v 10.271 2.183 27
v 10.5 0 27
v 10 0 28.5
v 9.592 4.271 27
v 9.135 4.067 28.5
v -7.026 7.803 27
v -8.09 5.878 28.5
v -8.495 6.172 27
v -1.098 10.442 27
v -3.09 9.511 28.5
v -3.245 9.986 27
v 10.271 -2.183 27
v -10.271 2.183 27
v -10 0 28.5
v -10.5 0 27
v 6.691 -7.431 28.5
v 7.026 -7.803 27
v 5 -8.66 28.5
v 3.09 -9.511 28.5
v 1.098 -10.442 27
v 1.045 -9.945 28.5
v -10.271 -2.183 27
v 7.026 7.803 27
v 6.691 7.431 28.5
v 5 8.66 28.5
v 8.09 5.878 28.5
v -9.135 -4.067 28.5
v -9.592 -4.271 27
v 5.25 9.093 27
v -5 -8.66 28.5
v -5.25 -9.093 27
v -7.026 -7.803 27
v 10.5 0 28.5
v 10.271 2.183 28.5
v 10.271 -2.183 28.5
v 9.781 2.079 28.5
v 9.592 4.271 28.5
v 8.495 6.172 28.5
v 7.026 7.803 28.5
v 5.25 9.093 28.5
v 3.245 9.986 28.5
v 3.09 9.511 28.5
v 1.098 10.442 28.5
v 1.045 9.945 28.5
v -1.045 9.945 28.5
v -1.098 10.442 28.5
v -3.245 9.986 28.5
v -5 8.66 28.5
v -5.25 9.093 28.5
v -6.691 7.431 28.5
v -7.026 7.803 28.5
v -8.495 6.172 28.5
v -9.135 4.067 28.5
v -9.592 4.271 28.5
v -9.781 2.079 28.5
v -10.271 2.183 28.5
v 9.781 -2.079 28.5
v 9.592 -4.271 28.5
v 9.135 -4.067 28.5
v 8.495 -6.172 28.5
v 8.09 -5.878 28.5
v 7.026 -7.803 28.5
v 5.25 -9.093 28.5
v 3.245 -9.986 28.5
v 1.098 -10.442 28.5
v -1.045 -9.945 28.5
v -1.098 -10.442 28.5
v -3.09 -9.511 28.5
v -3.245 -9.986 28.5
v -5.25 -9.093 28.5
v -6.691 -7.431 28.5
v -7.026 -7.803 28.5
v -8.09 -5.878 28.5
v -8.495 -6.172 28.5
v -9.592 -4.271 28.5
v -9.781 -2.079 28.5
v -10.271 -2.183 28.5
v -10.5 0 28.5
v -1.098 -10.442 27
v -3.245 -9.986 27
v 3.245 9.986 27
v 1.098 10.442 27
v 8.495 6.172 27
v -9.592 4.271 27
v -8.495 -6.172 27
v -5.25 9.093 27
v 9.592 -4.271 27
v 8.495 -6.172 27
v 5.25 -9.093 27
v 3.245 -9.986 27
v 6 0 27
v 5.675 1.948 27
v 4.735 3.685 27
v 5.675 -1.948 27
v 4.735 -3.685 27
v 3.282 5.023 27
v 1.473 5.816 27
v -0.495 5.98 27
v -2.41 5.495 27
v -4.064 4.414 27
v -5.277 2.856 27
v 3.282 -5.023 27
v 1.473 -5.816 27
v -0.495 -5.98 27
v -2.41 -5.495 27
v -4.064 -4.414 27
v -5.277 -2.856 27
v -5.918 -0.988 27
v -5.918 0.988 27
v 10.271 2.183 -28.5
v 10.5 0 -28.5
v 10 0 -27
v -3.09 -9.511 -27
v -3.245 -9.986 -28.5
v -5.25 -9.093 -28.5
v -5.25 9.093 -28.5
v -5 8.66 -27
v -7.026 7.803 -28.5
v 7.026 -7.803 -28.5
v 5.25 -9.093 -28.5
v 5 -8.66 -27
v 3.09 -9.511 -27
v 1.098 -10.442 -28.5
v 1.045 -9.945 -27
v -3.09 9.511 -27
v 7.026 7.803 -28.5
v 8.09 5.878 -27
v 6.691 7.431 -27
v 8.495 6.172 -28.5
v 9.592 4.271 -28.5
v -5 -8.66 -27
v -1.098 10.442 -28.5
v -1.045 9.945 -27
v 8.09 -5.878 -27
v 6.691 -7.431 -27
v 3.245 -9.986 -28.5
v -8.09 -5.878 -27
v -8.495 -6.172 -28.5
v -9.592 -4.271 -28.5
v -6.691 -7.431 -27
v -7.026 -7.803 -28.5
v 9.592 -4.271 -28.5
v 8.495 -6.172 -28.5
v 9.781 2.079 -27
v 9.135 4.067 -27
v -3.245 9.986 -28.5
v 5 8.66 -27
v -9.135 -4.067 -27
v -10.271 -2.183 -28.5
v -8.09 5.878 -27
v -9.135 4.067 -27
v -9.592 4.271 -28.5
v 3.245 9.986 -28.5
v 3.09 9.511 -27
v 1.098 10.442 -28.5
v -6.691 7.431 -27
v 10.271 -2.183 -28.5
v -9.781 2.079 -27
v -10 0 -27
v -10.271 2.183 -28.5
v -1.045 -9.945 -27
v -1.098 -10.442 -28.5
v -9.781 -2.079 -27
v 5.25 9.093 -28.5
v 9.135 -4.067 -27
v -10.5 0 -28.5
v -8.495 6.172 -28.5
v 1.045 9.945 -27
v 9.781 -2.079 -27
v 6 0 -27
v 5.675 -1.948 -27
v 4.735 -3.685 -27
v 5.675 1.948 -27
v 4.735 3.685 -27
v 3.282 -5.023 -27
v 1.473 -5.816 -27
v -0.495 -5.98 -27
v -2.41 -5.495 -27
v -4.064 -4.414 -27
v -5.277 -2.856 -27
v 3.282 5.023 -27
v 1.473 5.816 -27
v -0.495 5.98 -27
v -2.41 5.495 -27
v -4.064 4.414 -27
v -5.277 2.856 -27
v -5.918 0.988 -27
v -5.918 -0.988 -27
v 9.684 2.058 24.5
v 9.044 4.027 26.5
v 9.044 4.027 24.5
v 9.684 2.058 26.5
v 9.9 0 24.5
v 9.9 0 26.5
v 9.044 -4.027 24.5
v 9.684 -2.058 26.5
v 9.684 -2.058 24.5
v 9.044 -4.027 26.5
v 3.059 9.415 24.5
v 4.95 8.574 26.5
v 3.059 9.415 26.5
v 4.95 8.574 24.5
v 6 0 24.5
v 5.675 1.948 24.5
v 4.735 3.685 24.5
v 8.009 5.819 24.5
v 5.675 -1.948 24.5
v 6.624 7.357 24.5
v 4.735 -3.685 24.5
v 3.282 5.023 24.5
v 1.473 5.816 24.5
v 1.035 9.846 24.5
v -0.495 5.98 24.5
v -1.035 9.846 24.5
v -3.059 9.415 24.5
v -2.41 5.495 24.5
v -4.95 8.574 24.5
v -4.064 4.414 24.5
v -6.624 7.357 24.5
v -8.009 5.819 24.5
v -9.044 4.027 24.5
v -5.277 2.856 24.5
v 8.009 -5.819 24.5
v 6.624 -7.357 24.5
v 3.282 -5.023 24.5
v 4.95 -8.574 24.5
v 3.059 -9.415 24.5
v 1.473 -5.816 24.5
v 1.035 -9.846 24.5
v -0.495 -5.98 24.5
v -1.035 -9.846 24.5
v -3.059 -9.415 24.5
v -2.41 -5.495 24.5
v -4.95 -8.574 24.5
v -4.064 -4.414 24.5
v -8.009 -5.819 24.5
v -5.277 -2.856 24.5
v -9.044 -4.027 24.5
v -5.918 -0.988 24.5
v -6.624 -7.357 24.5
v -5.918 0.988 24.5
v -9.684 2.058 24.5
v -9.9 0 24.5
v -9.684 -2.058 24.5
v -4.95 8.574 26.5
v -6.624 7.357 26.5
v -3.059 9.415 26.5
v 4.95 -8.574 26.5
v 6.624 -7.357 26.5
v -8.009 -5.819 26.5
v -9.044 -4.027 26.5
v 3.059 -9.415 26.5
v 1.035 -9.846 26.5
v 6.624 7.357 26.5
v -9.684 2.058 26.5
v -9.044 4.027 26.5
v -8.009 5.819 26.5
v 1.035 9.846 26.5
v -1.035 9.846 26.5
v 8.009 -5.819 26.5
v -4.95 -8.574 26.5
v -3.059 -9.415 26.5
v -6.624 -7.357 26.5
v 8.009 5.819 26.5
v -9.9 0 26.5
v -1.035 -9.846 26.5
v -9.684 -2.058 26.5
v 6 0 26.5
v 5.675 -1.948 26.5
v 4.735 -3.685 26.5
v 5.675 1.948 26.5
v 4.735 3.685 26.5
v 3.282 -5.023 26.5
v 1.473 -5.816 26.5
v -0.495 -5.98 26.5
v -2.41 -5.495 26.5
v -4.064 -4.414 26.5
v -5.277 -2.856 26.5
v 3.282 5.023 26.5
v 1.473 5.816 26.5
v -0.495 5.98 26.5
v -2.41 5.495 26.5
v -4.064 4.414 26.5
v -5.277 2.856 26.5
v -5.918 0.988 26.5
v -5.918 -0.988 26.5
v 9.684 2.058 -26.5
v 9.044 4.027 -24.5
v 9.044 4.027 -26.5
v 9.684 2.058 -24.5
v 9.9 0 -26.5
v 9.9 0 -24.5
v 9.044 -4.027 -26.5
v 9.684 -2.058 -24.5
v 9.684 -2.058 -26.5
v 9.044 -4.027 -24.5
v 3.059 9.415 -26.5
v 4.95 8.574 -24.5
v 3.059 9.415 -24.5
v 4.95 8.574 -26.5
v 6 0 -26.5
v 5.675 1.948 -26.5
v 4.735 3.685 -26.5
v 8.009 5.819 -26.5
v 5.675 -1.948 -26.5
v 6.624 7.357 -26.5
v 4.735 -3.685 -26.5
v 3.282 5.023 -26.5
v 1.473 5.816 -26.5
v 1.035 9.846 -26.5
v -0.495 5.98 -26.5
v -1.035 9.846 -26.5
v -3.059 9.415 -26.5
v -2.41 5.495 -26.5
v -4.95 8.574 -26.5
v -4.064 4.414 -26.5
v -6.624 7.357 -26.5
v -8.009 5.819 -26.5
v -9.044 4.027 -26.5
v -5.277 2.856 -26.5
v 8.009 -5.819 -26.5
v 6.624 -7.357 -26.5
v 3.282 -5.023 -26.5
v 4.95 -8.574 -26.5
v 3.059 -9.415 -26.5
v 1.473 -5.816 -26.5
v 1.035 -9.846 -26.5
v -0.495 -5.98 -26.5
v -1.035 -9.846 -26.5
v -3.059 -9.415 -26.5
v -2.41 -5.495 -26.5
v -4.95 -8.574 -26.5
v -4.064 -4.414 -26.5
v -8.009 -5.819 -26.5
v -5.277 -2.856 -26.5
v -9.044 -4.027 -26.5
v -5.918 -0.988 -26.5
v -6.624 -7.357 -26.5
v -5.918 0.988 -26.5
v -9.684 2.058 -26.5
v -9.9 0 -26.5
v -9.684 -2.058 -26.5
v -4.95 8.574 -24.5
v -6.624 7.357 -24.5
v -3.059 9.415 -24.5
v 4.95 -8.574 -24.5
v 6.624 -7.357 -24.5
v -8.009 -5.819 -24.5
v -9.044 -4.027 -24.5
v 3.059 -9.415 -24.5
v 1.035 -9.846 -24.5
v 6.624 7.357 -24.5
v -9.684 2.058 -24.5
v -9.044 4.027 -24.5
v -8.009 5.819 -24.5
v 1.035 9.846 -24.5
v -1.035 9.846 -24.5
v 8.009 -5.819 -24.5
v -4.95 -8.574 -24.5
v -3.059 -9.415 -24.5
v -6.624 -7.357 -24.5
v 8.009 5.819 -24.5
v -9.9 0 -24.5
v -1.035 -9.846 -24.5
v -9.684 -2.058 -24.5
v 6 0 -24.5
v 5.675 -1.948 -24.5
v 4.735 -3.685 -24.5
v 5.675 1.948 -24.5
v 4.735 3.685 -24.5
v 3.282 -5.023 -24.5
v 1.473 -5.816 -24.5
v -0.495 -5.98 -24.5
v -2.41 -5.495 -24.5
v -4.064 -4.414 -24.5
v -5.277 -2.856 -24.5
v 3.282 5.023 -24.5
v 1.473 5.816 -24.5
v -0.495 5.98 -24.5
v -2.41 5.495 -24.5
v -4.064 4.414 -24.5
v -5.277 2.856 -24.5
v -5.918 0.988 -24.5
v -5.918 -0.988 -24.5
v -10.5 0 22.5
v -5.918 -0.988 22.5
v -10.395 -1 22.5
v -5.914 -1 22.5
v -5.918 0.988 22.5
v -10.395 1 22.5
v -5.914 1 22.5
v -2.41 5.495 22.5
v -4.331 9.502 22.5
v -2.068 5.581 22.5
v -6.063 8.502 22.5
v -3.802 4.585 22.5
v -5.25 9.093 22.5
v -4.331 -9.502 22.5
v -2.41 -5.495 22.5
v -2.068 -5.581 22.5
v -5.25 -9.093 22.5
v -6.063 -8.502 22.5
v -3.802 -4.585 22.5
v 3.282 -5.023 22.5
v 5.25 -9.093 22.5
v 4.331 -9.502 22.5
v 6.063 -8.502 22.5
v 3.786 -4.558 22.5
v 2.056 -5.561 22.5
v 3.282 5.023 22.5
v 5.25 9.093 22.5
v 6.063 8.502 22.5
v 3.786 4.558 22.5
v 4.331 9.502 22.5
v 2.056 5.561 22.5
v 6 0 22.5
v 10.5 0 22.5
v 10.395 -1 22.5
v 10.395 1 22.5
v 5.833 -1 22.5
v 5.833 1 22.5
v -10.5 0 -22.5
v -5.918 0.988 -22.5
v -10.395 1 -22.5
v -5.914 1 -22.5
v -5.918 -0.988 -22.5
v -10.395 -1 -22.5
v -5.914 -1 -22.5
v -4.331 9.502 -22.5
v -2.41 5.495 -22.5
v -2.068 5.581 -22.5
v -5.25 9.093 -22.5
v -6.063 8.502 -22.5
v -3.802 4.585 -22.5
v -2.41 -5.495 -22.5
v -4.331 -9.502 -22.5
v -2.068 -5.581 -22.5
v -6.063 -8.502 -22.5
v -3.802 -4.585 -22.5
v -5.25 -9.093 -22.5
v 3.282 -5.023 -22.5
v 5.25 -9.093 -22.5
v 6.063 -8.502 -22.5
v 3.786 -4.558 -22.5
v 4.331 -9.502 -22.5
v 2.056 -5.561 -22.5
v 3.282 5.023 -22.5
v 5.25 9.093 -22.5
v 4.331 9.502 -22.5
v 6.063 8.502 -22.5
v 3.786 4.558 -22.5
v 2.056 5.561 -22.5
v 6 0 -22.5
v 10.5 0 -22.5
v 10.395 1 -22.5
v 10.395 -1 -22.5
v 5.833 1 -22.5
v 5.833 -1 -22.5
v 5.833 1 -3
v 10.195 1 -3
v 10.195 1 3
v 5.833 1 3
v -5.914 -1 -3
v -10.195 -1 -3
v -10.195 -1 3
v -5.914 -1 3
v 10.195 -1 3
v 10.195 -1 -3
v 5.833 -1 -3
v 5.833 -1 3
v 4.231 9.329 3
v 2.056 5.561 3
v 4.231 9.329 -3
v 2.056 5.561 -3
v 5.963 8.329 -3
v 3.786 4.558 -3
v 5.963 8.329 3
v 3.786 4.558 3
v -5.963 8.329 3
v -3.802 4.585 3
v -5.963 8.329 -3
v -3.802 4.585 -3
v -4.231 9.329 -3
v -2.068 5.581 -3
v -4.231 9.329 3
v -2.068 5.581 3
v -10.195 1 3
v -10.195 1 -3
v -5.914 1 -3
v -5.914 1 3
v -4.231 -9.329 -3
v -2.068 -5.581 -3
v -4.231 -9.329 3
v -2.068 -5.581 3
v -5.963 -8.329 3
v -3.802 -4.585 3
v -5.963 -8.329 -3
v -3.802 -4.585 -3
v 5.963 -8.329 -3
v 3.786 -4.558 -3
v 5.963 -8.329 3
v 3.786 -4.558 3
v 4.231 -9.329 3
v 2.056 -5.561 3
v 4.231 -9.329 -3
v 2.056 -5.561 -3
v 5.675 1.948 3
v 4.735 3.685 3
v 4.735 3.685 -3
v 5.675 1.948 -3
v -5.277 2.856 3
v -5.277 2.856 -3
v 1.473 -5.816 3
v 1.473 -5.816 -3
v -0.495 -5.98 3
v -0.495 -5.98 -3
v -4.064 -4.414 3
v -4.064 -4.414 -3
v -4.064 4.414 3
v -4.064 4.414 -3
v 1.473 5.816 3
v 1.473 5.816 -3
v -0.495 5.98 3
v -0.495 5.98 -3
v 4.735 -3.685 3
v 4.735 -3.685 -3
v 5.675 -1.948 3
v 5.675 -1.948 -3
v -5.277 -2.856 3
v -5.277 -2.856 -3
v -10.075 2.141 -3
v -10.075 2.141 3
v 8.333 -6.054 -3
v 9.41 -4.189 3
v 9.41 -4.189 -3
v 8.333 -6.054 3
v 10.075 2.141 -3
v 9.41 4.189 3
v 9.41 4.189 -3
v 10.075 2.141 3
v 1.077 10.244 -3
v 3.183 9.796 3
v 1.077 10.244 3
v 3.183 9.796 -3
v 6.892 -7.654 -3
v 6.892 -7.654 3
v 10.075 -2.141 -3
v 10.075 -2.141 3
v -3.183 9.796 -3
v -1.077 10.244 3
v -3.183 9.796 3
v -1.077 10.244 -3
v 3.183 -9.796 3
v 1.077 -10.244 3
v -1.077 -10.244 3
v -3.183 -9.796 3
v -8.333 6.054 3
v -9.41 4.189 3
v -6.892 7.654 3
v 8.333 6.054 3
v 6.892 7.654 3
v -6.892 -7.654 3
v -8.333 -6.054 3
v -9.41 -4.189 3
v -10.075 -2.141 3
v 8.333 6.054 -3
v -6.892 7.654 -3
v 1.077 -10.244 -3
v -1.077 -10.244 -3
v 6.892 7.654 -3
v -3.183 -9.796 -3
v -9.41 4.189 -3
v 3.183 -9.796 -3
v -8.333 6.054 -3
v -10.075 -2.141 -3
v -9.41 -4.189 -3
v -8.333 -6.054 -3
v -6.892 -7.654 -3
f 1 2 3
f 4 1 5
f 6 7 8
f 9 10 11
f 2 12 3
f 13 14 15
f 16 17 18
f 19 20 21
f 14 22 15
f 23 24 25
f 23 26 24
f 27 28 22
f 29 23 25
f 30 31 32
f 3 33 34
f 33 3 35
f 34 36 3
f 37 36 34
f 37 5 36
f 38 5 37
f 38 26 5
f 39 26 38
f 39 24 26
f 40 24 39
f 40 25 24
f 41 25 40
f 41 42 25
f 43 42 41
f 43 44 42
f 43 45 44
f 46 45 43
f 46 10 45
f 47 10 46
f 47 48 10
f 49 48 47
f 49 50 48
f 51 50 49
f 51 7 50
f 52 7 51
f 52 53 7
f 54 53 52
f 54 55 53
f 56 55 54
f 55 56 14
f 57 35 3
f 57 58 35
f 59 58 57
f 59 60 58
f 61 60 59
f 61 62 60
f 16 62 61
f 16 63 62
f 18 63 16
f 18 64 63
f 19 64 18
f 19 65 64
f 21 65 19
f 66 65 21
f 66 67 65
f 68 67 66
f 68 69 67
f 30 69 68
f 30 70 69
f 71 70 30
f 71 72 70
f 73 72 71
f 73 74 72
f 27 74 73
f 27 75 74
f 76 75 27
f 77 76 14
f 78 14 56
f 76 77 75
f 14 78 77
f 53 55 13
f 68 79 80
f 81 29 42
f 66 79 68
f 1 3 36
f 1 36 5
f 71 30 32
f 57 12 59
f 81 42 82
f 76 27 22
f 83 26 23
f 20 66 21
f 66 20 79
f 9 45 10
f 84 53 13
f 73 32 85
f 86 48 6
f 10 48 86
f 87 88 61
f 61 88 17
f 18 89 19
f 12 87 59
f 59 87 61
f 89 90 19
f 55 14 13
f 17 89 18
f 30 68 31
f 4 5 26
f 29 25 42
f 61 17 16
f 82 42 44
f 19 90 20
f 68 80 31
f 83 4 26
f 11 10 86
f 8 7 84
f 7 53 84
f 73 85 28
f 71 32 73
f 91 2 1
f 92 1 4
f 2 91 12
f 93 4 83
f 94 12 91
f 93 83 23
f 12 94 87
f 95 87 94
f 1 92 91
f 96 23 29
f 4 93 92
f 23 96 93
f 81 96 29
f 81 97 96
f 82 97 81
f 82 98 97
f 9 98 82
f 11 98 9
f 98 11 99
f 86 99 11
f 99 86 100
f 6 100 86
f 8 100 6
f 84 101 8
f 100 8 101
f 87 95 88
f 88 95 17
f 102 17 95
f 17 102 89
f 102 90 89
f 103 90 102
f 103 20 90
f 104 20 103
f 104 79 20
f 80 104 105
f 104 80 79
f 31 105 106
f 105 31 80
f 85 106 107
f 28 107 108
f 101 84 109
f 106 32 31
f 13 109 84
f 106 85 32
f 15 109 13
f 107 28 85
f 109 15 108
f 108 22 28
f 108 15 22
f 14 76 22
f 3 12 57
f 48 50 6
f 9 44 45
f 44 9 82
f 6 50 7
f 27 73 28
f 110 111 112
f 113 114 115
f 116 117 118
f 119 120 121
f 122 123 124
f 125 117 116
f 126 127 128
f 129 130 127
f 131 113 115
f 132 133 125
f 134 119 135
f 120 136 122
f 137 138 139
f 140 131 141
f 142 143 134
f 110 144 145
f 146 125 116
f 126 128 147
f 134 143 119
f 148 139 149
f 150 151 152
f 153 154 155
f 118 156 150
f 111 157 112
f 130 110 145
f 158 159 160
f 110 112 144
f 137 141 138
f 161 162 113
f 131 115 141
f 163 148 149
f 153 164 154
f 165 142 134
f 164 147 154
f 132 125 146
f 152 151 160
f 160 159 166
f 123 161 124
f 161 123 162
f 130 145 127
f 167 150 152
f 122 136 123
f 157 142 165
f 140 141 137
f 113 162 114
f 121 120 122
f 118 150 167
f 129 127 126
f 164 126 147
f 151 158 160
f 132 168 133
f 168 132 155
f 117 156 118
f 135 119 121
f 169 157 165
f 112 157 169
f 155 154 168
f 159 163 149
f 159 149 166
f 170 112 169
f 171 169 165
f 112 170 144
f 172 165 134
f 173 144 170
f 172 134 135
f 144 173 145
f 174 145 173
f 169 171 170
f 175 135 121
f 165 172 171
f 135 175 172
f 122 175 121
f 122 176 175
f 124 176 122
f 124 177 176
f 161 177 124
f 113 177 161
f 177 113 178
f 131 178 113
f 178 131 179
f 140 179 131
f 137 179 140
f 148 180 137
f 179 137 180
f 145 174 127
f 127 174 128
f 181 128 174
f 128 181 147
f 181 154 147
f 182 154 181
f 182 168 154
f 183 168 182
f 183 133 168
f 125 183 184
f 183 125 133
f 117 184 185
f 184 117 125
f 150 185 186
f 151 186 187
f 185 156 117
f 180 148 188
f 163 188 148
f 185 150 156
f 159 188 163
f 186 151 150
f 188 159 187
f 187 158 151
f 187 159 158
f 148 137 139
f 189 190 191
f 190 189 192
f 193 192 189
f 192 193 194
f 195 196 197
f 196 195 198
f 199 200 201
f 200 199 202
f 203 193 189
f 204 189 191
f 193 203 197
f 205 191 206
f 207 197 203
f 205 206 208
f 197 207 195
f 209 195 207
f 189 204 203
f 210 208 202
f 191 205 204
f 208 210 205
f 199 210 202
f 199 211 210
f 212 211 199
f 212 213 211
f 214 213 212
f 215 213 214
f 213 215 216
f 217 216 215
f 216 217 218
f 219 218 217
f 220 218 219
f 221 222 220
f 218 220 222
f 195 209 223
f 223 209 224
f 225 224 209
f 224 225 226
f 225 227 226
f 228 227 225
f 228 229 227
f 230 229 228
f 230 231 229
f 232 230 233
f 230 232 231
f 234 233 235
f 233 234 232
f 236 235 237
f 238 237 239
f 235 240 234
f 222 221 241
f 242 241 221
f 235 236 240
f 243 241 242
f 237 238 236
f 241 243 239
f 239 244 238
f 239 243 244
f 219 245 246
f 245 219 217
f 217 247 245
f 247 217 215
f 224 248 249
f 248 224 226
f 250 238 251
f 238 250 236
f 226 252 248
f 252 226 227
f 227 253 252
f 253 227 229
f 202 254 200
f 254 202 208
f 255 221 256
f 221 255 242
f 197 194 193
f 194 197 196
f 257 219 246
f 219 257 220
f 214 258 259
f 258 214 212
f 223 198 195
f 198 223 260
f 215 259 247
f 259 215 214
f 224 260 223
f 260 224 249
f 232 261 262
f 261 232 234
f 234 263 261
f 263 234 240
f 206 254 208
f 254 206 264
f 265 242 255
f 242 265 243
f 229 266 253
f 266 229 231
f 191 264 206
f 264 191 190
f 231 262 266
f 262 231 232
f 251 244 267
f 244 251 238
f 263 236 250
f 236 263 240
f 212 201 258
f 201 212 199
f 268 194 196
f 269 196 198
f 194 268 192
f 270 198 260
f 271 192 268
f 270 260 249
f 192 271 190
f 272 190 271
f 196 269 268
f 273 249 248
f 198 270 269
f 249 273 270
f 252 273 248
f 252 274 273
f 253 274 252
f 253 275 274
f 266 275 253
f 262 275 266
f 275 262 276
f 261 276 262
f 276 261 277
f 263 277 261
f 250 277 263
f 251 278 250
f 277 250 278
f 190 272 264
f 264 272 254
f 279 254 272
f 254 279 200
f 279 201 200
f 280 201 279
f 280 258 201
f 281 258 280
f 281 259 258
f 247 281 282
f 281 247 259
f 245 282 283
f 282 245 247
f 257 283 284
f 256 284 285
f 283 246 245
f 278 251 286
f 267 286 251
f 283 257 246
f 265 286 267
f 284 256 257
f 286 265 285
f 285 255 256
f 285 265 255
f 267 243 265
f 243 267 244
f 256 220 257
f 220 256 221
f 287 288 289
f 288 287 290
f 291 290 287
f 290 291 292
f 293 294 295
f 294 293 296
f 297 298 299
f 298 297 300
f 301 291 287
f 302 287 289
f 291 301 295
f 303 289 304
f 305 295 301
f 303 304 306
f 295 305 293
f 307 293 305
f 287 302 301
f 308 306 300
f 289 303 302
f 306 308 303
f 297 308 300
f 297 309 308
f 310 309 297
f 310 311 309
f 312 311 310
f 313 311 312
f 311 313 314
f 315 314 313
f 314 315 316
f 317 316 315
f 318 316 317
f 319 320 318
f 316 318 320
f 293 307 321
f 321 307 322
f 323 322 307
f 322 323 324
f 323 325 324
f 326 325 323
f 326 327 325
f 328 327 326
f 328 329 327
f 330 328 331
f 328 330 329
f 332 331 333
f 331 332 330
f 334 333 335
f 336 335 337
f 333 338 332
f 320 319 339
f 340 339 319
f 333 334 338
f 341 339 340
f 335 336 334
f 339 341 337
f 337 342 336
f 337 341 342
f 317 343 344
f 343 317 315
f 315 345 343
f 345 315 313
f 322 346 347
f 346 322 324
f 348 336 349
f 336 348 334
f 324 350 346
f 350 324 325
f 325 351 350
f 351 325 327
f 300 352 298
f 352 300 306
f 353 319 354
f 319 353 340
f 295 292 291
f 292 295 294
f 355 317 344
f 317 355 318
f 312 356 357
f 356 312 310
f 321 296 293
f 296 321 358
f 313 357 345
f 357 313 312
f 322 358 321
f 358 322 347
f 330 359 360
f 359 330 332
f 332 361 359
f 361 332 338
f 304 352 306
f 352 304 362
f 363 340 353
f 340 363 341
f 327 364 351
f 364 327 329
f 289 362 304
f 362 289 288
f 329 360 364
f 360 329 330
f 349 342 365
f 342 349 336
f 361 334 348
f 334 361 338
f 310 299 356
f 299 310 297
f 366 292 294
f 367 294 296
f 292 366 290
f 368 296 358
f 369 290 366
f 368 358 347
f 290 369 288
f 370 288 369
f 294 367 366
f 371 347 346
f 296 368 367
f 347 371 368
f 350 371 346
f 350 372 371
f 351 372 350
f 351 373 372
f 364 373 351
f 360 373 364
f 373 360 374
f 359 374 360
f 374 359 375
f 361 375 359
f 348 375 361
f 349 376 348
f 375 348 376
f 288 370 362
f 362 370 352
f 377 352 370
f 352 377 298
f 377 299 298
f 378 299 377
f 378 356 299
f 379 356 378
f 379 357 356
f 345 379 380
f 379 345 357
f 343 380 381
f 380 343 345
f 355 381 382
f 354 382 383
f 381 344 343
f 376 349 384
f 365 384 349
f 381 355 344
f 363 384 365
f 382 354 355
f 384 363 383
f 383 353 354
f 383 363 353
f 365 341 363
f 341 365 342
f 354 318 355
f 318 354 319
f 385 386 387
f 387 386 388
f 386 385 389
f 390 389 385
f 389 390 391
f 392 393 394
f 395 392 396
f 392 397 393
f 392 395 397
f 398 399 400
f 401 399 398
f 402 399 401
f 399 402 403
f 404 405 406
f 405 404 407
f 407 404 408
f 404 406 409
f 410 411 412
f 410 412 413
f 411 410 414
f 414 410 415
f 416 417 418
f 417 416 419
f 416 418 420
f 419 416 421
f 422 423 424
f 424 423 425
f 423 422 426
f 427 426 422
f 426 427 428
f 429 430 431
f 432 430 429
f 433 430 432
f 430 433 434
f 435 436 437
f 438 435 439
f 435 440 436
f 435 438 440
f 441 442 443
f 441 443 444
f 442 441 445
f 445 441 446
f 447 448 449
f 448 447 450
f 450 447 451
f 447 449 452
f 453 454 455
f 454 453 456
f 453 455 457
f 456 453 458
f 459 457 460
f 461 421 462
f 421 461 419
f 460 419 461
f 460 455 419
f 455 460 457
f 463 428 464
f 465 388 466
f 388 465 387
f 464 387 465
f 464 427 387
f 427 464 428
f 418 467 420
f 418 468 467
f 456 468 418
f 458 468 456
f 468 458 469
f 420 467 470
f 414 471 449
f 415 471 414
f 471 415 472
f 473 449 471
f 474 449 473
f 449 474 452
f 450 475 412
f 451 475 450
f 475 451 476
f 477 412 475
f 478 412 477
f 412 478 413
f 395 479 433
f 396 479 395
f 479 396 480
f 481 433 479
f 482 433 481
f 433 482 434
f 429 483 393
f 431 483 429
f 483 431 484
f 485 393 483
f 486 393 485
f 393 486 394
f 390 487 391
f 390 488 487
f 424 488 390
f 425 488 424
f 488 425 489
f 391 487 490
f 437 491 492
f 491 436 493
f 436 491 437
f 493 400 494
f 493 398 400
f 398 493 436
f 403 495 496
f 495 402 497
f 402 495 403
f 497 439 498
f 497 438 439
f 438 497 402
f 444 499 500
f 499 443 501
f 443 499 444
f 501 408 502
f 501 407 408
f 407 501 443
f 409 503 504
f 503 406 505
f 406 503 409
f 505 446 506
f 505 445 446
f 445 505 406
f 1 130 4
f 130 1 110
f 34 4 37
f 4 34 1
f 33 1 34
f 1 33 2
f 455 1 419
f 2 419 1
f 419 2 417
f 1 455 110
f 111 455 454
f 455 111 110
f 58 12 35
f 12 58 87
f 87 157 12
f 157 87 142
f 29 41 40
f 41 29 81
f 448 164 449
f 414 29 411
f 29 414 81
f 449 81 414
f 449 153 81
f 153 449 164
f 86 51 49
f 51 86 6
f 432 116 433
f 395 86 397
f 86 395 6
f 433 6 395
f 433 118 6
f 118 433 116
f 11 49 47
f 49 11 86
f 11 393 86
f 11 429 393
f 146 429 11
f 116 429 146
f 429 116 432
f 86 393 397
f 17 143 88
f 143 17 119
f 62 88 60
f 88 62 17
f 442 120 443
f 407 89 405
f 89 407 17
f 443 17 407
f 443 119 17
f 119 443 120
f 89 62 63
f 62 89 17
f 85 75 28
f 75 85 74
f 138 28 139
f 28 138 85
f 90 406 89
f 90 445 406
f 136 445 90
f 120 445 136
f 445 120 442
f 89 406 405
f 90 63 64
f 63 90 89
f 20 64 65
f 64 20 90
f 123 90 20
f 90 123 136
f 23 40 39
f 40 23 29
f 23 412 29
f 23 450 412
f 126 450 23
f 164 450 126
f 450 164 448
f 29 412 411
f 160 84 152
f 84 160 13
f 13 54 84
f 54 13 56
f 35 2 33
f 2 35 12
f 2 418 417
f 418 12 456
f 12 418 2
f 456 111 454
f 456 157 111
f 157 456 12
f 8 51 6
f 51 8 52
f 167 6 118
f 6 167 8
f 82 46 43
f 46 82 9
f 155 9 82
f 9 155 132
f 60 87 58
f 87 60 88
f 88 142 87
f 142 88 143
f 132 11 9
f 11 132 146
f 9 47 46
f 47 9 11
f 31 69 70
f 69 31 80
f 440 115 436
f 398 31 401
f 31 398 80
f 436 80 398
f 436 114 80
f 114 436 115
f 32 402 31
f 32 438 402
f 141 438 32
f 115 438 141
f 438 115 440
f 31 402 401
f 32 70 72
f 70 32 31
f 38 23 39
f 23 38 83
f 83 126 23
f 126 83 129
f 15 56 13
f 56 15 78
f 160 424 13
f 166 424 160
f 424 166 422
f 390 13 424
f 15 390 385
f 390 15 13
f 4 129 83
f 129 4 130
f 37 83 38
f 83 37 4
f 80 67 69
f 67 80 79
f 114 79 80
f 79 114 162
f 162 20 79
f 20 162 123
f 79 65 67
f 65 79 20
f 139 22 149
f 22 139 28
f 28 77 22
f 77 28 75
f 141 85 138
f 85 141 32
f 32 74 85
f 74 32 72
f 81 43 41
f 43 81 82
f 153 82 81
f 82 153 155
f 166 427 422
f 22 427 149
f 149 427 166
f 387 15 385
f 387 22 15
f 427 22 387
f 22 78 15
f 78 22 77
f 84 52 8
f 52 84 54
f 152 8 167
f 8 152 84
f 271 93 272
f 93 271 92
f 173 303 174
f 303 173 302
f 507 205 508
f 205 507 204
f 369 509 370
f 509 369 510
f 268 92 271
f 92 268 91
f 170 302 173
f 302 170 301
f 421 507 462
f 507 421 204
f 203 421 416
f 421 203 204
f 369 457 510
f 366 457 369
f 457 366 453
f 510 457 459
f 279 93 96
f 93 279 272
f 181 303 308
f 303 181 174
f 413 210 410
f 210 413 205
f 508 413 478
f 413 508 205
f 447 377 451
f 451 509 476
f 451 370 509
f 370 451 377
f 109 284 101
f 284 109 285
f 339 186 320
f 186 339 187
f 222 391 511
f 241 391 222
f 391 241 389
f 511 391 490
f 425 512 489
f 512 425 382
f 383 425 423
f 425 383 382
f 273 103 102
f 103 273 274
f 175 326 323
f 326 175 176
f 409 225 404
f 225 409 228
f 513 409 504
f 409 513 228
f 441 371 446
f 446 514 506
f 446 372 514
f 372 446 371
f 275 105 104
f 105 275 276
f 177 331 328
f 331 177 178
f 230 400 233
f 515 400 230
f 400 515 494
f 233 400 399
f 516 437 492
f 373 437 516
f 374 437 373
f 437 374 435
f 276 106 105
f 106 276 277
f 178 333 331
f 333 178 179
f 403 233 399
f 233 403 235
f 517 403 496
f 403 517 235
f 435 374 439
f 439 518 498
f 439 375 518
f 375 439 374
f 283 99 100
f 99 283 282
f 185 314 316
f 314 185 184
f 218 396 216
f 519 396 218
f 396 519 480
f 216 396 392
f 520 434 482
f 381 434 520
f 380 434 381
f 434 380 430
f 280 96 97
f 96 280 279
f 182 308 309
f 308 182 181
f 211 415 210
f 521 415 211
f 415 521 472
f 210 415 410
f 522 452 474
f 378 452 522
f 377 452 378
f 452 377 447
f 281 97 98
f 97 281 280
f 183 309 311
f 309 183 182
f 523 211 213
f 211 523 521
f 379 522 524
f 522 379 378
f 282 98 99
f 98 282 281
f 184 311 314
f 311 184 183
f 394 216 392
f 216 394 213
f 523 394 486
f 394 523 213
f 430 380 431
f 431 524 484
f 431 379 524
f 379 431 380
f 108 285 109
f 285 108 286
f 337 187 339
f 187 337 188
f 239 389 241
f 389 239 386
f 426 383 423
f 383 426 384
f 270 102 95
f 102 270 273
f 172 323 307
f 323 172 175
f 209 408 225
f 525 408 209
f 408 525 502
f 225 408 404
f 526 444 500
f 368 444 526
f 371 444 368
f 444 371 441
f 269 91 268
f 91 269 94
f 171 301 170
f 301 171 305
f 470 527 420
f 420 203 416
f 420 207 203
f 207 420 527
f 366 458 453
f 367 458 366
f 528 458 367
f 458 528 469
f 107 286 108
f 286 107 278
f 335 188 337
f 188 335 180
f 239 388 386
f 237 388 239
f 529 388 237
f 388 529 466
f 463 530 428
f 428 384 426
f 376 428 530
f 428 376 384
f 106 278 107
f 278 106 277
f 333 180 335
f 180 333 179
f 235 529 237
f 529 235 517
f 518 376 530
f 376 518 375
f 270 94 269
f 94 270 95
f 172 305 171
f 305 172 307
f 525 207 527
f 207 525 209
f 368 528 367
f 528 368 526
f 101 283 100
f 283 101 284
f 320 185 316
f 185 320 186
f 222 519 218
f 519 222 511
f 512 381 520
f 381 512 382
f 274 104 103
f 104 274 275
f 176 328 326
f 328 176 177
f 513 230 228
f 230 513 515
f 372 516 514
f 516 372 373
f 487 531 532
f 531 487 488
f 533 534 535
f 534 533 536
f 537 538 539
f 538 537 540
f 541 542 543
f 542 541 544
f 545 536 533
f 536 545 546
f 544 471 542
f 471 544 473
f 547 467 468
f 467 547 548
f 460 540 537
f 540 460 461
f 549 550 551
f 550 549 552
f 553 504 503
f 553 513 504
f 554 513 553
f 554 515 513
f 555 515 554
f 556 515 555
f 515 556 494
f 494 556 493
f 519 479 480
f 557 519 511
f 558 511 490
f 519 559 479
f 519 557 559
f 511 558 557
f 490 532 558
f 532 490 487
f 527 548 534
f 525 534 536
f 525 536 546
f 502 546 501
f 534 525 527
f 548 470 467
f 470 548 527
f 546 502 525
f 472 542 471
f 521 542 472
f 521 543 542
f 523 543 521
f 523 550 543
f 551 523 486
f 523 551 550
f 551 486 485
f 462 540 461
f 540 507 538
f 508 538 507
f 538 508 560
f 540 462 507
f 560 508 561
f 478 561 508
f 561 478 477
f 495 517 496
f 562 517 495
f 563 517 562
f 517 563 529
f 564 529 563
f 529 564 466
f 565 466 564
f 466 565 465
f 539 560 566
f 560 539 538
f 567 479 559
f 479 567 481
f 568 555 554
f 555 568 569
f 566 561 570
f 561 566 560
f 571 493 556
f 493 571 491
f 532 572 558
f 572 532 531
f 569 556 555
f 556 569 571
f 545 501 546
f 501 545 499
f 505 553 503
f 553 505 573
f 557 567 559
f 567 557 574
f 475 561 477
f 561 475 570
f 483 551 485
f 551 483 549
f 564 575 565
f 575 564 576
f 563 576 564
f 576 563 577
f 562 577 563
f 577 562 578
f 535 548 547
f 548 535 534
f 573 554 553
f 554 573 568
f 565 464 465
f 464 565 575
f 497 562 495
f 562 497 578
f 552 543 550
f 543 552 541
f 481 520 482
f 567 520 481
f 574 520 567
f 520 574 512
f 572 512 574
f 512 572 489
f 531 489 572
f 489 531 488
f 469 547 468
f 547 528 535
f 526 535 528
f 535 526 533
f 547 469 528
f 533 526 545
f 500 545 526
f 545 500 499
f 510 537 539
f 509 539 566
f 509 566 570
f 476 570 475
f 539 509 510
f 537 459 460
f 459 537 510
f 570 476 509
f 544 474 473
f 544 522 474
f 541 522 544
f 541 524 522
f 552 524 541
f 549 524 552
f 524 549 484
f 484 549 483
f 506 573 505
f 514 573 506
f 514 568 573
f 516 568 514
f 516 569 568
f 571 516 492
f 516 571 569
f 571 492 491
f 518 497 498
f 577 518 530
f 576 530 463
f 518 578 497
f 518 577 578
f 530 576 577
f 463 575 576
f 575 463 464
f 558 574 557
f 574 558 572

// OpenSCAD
// Parameters
bore_d = 12.0; //[6.0:24.0:0.1]
outer_d = 21.0; //[10.5:42.0:0.1]
length = 57.0; //[28.5:114.0:0.5]
chamfer = 0.5; //[0.2:2.0:0.1]
overlap = 1.0; //[0.5:2.0:0.1]
seal_groove_width = 2.0; //[1.0:5.0:0.1]
seal_groove_depth = 0.6; //[0.2:1.5:0.1]
seal_groove_offset = 3.0; //[1.0:10.0:0.1]
track_count = 6; //[3:10:1]
track_width = 2.0; //[1.0:4.0:0.1]
track_depth = 0.4; //[0.1:1.2:0.1]
track_length_margin = 6.0; //[2.0:15.0:0.5]
marking_depth = 0.2; //[0.1:0.8:0.05]
marking_width = 6.0; //[2.0:15.0:0.5]

// Base Shapes
module outer_cylinder_body() {
  cylinder(h=length, r=outer_d/2, center=true);
}

module through_bore() {
  cylinder(h=length + 2*overlap, r=bore_d/2, center=true);
}

module end_face_chamfer_top() {
  translate([0, 0, length/2 - (chamfer + overlap)/2])
    cylinder(h=chamfer + overlap, r1=outer_d/2, r2=outer_d/2 - chamfer, center=true);
}

module end_face_chamfer_bottom() {
  translate([0, 0, -length/2 + (chamfer + overlap)/2])
    cylinder(h=chamfer + overlap, r1=outer_d/2, r2=outer_d/2 - chamfer, center=true);
}

module seal_groove_top() {
  translate([0, 0, length/2 - seal_groove_offset])
    cylinder(h=seal_groove_width, r=outer_d/2, center=true);
}

module seal_groove_bottom() {
  translate([0, 0, -length/2 + seal_groove_offset])
    cylinder(h=seal_groove_width, r=outer_d/2, center=true);
}

module ball_track_cut(i) {
  rotate([0, 0, i*360/track_count])
    translate([bore_d/2 - track_depth/2, 0, 0])
      cube([bore_d + 2*track_depth + 2*overlap, track_width, length - 2*track_length_margin], center=true);
}

module manufacturer_markings_band() {
  cylinder(h=marking_width, r=outer_d/2, center=true);
}

// Operations
module seal_grooves() {
  difference() {
    union() {
      seal_groove_top();
      seal_groove_bottom();
    }
    through_bore();
  }
}

module seal_grooves_scaled() {
  scale([(outer_d - 2*seal_groove_depth)/outer_d, (outer_d - 2*seal_groove_depth)/outer_d, 1])
    seal_grooves();
}

module end_face_chamfers() {
  union() {
    end_face_chamfer_top();
    end_face_chamfer_bottom();
  }
}

module ball_track_detail() {
  union() {
    for (i = [0:track_count-1])
      ball_track_cut(i);
  }
}

module manufacturer_markings() {
  scale([(outer_d - 2*marking_depth)/outer_d, (outer_d - 2*marking_depth)/outer_d, 1])
    manufacturer_markings_band();
}

// Final Output
difference() {
  outer_cylinder_body();
  through_bore();
  end_face_chamfers();
  seal_grooves_scaled();
  ball_track_detail();
  manufacturer_markings();
}
